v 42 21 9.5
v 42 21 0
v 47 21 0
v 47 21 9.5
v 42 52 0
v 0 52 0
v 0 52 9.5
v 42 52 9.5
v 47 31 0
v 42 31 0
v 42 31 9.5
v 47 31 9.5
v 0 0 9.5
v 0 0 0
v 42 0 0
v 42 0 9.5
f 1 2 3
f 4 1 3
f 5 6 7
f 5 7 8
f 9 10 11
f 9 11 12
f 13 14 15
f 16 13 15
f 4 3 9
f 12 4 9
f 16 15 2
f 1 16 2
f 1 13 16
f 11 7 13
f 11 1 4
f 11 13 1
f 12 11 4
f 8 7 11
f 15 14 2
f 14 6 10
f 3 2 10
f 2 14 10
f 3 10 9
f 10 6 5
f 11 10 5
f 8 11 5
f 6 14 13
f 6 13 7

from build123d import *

# Parameters (mm, degrees)
BOX007_W     = 42
BOX007_H     = 52
BOX007_DEPTH = 9.5
BOX008_W     = 5
BOX008_H     = 10
BOX008_DEPTH = 9.5


with BuildPart() as cube006:
    # Box007 → Box007 (new body)
    with BuildSketch(Plane.XY):
        with Locations((21, 26)):
            Rectangle(BOX007_W, BOX007_H)
    extrude(amount=BOX007_DEPTH)


with BuildPart() as usb_fusion:
    # Box008 → Box008 (new body)
    with BuildSketch(Plane(origin=(42, 21, 0), x_dir=(1, 0, 0), z_dir=(0, 0, 1))):
        with Locations((2.5, 5)):
            Rectangle(BOX008_W, BOX008_H)
    extrude(amount=BOX008_DEPTH)

    # Fusion001: union Cube006
    add(cube006.part)


solid = usb_fusion.part
